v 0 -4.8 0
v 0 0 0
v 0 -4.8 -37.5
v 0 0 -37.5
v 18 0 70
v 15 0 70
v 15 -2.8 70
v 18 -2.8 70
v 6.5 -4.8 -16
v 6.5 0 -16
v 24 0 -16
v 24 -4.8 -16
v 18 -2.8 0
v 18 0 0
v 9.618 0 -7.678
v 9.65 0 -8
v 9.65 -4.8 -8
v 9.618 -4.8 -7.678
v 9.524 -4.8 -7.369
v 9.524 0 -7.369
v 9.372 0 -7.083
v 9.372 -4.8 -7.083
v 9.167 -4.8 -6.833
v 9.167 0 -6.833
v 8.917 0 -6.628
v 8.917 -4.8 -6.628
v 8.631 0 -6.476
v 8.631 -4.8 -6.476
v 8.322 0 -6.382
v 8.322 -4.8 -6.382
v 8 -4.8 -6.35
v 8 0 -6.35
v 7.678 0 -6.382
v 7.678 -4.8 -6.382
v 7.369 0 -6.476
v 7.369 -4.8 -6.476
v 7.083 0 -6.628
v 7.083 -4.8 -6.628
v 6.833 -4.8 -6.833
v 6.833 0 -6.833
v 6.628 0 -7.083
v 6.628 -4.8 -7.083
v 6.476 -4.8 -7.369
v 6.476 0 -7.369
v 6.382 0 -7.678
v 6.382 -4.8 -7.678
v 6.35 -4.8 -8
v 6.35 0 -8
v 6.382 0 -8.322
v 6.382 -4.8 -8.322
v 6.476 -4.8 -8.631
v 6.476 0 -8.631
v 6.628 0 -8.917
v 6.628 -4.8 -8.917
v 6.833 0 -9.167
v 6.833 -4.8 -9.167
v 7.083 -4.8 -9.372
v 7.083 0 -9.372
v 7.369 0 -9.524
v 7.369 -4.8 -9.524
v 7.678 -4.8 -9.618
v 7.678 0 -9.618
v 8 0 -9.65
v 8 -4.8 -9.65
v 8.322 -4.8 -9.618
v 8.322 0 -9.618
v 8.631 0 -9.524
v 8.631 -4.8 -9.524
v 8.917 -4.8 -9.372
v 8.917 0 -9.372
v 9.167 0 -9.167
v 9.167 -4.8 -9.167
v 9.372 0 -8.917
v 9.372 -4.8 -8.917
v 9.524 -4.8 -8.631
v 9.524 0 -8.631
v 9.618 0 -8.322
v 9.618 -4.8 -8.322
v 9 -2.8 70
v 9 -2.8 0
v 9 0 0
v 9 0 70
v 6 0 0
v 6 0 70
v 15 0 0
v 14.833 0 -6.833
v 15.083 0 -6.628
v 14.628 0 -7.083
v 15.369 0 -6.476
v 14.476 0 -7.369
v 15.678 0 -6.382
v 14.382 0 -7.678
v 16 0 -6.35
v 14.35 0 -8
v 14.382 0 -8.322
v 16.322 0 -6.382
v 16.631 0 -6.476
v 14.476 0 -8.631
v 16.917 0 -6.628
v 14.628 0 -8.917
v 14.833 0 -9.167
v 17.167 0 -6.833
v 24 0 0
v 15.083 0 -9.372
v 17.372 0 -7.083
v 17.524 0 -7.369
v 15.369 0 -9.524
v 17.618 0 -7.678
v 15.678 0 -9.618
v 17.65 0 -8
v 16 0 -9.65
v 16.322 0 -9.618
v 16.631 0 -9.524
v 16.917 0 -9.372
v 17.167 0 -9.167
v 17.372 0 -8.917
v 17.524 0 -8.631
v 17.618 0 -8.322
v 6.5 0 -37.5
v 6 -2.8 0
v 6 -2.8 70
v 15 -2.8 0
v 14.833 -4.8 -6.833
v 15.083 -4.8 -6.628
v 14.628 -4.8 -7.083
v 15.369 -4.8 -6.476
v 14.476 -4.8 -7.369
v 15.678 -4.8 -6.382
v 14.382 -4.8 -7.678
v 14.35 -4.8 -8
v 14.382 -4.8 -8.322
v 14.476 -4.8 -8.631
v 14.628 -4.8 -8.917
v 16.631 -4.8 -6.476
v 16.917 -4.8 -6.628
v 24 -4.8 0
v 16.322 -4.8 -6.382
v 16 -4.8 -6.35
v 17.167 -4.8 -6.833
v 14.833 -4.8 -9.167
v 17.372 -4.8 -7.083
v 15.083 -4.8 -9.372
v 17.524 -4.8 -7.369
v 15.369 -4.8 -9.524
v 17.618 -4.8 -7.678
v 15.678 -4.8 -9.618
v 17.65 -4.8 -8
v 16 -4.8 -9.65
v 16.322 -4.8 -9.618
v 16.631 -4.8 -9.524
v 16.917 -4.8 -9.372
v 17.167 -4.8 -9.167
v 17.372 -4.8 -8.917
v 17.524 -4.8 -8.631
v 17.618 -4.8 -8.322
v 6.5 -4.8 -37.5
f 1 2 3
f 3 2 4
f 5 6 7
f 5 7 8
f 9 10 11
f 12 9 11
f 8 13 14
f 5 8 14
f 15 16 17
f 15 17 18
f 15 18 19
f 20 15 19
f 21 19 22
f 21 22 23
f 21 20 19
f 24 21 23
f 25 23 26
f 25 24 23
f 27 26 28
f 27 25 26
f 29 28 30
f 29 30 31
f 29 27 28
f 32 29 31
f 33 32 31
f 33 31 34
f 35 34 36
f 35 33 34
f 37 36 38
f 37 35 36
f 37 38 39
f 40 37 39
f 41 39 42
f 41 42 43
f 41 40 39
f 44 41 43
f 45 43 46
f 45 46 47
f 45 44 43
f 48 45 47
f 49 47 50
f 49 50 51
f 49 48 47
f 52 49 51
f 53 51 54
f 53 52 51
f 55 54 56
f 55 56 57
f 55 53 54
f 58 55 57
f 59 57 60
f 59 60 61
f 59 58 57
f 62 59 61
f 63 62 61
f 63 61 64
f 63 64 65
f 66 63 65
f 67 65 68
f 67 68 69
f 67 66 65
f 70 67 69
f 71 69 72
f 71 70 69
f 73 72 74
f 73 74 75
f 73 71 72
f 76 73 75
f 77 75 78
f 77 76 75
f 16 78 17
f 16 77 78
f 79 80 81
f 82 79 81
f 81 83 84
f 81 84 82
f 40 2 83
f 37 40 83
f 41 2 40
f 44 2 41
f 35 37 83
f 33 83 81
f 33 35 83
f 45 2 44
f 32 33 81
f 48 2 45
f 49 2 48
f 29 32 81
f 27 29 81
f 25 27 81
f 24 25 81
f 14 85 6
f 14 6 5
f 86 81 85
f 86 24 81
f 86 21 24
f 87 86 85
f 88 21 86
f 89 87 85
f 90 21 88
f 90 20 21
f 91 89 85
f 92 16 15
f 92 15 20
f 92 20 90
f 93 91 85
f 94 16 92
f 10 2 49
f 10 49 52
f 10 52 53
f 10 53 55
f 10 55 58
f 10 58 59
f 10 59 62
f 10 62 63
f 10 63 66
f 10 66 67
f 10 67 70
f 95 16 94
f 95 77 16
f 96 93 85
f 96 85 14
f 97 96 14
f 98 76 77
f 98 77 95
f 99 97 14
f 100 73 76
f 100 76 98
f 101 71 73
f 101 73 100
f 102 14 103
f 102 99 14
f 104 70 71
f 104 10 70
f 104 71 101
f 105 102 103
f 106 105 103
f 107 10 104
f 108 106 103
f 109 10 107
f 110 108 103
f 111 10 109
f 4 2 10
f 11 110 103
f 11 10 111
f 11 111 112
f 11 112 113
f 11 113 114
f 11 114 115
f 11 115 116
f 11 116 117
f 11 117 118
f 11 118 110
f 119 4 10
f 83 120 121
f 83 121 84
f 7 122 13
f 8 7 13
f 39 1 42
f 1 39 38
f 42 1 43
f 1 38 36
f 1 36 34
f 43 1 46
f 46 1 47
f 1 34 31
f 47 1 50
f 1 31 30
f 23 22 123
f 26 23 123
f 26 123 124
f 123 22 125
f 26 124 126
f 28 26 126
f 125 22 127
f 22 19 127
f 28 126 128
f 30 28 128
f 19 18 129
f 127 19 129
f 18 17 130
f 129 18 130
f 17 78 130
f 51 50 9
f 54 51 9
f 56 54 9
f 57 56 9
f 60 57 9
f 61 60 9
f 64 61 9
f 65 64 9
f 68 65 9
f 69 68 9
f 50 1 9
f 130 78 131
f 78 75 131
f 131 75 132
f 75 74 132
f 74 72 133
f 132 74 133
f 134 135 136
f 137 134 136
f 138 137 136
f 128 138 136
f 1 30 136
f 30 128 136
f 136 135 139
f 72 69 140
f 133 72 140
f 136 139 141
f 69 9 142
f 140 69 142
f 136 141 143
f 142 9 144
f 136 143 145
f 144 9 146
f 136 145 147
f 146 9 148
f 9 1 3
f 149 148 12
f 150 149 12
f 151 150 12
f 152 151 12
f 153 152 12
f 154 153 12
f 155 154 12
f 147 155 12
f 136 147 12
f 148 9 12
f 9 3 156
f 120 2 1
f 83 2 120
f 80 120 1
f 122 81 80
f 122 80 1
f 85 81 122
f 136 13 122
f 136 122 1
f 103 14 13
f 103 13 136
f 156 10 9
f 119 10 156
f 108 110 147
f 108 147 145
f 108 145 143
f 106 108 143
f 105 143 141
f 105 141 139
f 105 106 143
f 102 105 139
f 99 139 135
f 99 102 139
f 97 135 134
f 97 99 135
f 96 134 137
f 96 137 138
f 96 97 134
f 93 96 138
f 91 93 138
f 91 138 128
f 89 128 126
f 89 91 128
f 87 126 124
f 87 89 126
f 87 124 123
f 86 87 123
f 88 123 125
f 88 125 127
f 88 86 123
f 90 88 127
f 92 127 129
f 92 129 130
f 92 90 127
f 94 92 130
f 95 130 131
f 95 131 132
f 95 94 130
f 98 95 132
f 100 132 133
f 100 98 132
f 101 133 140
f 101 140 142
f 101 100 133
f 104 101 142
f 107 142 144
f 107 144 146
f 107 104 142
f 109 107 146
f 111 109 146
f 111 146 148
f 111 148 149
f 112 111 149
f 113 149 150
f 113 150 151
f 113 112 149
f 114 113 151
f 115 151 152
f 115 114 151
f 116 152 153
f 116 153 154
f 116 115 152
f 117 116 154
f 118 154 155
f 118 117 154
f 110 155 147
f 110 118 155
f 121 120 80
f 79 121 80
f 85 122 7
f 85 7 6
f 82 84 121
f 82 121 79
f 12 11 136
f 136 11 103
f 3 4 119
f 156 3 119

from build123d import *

# Parameters (mm, degrees)
SKETCH1_W           = 24
SKETCH1_H           = 16
SKETCH1_R           = 1.65
BOSS_EXTRUDE1_DEPTH = 4.8
SKETCH2_W           = 3
SKETCH2_H           = 2.8
BOSS_EXTRUDE2_DEPTH = 70
SKETCH4_W           = 6.5
SKETCH4_H           = 21.5
BOSS_EXTRUDE3_DEPTH = 4.8


with BuildPart() as part:
    # Sketch1 → Boss-Extrude1 (new body)
    with BuildSketch(Plane.XZ):
        with Locations((12, -8)):
            Rectangle(SKETCH1_W, SKETCH1_H)
        with Locations((8, -8)):
            Circle(SKETCH1_R, mode=Mode.SUBTRACT)
        with Locations((16, -8)):
            Circle(SKETCH1_R, mode=Mode.SUBTRACT)
    extrude(amount=BOSS_EXTRUDE1_DEPTH)

    # Sketch2 → Boss-Extrude2 (add)
    with BuildSketch(Plane.XY):
        with Locations((7.5, -1.4)):
            Rectangle(SKETCH2_W, SKETCH2_H)
        with Locations((16.5, -1.4)):
            Rectangle(SKETCH2_W, SKETCH2_H)
    extrude(amount=BOSS_EXTRUDE2_DEPTH)

    # Sketch4 → Boss-Extrude3 (add)
    with BuildSketch(Plane(origin=(0, 0, 0), x_dir=(1, 0, 0), z_dir=(0, 1, 0))):
        with Locations((3.25, 26.75)):
            Rectangle(SKETCH4_W, SKETCH4_H)
    extrude(amount=-BOSS_EXTRUDE3_DEPTH)


solid = part.part
